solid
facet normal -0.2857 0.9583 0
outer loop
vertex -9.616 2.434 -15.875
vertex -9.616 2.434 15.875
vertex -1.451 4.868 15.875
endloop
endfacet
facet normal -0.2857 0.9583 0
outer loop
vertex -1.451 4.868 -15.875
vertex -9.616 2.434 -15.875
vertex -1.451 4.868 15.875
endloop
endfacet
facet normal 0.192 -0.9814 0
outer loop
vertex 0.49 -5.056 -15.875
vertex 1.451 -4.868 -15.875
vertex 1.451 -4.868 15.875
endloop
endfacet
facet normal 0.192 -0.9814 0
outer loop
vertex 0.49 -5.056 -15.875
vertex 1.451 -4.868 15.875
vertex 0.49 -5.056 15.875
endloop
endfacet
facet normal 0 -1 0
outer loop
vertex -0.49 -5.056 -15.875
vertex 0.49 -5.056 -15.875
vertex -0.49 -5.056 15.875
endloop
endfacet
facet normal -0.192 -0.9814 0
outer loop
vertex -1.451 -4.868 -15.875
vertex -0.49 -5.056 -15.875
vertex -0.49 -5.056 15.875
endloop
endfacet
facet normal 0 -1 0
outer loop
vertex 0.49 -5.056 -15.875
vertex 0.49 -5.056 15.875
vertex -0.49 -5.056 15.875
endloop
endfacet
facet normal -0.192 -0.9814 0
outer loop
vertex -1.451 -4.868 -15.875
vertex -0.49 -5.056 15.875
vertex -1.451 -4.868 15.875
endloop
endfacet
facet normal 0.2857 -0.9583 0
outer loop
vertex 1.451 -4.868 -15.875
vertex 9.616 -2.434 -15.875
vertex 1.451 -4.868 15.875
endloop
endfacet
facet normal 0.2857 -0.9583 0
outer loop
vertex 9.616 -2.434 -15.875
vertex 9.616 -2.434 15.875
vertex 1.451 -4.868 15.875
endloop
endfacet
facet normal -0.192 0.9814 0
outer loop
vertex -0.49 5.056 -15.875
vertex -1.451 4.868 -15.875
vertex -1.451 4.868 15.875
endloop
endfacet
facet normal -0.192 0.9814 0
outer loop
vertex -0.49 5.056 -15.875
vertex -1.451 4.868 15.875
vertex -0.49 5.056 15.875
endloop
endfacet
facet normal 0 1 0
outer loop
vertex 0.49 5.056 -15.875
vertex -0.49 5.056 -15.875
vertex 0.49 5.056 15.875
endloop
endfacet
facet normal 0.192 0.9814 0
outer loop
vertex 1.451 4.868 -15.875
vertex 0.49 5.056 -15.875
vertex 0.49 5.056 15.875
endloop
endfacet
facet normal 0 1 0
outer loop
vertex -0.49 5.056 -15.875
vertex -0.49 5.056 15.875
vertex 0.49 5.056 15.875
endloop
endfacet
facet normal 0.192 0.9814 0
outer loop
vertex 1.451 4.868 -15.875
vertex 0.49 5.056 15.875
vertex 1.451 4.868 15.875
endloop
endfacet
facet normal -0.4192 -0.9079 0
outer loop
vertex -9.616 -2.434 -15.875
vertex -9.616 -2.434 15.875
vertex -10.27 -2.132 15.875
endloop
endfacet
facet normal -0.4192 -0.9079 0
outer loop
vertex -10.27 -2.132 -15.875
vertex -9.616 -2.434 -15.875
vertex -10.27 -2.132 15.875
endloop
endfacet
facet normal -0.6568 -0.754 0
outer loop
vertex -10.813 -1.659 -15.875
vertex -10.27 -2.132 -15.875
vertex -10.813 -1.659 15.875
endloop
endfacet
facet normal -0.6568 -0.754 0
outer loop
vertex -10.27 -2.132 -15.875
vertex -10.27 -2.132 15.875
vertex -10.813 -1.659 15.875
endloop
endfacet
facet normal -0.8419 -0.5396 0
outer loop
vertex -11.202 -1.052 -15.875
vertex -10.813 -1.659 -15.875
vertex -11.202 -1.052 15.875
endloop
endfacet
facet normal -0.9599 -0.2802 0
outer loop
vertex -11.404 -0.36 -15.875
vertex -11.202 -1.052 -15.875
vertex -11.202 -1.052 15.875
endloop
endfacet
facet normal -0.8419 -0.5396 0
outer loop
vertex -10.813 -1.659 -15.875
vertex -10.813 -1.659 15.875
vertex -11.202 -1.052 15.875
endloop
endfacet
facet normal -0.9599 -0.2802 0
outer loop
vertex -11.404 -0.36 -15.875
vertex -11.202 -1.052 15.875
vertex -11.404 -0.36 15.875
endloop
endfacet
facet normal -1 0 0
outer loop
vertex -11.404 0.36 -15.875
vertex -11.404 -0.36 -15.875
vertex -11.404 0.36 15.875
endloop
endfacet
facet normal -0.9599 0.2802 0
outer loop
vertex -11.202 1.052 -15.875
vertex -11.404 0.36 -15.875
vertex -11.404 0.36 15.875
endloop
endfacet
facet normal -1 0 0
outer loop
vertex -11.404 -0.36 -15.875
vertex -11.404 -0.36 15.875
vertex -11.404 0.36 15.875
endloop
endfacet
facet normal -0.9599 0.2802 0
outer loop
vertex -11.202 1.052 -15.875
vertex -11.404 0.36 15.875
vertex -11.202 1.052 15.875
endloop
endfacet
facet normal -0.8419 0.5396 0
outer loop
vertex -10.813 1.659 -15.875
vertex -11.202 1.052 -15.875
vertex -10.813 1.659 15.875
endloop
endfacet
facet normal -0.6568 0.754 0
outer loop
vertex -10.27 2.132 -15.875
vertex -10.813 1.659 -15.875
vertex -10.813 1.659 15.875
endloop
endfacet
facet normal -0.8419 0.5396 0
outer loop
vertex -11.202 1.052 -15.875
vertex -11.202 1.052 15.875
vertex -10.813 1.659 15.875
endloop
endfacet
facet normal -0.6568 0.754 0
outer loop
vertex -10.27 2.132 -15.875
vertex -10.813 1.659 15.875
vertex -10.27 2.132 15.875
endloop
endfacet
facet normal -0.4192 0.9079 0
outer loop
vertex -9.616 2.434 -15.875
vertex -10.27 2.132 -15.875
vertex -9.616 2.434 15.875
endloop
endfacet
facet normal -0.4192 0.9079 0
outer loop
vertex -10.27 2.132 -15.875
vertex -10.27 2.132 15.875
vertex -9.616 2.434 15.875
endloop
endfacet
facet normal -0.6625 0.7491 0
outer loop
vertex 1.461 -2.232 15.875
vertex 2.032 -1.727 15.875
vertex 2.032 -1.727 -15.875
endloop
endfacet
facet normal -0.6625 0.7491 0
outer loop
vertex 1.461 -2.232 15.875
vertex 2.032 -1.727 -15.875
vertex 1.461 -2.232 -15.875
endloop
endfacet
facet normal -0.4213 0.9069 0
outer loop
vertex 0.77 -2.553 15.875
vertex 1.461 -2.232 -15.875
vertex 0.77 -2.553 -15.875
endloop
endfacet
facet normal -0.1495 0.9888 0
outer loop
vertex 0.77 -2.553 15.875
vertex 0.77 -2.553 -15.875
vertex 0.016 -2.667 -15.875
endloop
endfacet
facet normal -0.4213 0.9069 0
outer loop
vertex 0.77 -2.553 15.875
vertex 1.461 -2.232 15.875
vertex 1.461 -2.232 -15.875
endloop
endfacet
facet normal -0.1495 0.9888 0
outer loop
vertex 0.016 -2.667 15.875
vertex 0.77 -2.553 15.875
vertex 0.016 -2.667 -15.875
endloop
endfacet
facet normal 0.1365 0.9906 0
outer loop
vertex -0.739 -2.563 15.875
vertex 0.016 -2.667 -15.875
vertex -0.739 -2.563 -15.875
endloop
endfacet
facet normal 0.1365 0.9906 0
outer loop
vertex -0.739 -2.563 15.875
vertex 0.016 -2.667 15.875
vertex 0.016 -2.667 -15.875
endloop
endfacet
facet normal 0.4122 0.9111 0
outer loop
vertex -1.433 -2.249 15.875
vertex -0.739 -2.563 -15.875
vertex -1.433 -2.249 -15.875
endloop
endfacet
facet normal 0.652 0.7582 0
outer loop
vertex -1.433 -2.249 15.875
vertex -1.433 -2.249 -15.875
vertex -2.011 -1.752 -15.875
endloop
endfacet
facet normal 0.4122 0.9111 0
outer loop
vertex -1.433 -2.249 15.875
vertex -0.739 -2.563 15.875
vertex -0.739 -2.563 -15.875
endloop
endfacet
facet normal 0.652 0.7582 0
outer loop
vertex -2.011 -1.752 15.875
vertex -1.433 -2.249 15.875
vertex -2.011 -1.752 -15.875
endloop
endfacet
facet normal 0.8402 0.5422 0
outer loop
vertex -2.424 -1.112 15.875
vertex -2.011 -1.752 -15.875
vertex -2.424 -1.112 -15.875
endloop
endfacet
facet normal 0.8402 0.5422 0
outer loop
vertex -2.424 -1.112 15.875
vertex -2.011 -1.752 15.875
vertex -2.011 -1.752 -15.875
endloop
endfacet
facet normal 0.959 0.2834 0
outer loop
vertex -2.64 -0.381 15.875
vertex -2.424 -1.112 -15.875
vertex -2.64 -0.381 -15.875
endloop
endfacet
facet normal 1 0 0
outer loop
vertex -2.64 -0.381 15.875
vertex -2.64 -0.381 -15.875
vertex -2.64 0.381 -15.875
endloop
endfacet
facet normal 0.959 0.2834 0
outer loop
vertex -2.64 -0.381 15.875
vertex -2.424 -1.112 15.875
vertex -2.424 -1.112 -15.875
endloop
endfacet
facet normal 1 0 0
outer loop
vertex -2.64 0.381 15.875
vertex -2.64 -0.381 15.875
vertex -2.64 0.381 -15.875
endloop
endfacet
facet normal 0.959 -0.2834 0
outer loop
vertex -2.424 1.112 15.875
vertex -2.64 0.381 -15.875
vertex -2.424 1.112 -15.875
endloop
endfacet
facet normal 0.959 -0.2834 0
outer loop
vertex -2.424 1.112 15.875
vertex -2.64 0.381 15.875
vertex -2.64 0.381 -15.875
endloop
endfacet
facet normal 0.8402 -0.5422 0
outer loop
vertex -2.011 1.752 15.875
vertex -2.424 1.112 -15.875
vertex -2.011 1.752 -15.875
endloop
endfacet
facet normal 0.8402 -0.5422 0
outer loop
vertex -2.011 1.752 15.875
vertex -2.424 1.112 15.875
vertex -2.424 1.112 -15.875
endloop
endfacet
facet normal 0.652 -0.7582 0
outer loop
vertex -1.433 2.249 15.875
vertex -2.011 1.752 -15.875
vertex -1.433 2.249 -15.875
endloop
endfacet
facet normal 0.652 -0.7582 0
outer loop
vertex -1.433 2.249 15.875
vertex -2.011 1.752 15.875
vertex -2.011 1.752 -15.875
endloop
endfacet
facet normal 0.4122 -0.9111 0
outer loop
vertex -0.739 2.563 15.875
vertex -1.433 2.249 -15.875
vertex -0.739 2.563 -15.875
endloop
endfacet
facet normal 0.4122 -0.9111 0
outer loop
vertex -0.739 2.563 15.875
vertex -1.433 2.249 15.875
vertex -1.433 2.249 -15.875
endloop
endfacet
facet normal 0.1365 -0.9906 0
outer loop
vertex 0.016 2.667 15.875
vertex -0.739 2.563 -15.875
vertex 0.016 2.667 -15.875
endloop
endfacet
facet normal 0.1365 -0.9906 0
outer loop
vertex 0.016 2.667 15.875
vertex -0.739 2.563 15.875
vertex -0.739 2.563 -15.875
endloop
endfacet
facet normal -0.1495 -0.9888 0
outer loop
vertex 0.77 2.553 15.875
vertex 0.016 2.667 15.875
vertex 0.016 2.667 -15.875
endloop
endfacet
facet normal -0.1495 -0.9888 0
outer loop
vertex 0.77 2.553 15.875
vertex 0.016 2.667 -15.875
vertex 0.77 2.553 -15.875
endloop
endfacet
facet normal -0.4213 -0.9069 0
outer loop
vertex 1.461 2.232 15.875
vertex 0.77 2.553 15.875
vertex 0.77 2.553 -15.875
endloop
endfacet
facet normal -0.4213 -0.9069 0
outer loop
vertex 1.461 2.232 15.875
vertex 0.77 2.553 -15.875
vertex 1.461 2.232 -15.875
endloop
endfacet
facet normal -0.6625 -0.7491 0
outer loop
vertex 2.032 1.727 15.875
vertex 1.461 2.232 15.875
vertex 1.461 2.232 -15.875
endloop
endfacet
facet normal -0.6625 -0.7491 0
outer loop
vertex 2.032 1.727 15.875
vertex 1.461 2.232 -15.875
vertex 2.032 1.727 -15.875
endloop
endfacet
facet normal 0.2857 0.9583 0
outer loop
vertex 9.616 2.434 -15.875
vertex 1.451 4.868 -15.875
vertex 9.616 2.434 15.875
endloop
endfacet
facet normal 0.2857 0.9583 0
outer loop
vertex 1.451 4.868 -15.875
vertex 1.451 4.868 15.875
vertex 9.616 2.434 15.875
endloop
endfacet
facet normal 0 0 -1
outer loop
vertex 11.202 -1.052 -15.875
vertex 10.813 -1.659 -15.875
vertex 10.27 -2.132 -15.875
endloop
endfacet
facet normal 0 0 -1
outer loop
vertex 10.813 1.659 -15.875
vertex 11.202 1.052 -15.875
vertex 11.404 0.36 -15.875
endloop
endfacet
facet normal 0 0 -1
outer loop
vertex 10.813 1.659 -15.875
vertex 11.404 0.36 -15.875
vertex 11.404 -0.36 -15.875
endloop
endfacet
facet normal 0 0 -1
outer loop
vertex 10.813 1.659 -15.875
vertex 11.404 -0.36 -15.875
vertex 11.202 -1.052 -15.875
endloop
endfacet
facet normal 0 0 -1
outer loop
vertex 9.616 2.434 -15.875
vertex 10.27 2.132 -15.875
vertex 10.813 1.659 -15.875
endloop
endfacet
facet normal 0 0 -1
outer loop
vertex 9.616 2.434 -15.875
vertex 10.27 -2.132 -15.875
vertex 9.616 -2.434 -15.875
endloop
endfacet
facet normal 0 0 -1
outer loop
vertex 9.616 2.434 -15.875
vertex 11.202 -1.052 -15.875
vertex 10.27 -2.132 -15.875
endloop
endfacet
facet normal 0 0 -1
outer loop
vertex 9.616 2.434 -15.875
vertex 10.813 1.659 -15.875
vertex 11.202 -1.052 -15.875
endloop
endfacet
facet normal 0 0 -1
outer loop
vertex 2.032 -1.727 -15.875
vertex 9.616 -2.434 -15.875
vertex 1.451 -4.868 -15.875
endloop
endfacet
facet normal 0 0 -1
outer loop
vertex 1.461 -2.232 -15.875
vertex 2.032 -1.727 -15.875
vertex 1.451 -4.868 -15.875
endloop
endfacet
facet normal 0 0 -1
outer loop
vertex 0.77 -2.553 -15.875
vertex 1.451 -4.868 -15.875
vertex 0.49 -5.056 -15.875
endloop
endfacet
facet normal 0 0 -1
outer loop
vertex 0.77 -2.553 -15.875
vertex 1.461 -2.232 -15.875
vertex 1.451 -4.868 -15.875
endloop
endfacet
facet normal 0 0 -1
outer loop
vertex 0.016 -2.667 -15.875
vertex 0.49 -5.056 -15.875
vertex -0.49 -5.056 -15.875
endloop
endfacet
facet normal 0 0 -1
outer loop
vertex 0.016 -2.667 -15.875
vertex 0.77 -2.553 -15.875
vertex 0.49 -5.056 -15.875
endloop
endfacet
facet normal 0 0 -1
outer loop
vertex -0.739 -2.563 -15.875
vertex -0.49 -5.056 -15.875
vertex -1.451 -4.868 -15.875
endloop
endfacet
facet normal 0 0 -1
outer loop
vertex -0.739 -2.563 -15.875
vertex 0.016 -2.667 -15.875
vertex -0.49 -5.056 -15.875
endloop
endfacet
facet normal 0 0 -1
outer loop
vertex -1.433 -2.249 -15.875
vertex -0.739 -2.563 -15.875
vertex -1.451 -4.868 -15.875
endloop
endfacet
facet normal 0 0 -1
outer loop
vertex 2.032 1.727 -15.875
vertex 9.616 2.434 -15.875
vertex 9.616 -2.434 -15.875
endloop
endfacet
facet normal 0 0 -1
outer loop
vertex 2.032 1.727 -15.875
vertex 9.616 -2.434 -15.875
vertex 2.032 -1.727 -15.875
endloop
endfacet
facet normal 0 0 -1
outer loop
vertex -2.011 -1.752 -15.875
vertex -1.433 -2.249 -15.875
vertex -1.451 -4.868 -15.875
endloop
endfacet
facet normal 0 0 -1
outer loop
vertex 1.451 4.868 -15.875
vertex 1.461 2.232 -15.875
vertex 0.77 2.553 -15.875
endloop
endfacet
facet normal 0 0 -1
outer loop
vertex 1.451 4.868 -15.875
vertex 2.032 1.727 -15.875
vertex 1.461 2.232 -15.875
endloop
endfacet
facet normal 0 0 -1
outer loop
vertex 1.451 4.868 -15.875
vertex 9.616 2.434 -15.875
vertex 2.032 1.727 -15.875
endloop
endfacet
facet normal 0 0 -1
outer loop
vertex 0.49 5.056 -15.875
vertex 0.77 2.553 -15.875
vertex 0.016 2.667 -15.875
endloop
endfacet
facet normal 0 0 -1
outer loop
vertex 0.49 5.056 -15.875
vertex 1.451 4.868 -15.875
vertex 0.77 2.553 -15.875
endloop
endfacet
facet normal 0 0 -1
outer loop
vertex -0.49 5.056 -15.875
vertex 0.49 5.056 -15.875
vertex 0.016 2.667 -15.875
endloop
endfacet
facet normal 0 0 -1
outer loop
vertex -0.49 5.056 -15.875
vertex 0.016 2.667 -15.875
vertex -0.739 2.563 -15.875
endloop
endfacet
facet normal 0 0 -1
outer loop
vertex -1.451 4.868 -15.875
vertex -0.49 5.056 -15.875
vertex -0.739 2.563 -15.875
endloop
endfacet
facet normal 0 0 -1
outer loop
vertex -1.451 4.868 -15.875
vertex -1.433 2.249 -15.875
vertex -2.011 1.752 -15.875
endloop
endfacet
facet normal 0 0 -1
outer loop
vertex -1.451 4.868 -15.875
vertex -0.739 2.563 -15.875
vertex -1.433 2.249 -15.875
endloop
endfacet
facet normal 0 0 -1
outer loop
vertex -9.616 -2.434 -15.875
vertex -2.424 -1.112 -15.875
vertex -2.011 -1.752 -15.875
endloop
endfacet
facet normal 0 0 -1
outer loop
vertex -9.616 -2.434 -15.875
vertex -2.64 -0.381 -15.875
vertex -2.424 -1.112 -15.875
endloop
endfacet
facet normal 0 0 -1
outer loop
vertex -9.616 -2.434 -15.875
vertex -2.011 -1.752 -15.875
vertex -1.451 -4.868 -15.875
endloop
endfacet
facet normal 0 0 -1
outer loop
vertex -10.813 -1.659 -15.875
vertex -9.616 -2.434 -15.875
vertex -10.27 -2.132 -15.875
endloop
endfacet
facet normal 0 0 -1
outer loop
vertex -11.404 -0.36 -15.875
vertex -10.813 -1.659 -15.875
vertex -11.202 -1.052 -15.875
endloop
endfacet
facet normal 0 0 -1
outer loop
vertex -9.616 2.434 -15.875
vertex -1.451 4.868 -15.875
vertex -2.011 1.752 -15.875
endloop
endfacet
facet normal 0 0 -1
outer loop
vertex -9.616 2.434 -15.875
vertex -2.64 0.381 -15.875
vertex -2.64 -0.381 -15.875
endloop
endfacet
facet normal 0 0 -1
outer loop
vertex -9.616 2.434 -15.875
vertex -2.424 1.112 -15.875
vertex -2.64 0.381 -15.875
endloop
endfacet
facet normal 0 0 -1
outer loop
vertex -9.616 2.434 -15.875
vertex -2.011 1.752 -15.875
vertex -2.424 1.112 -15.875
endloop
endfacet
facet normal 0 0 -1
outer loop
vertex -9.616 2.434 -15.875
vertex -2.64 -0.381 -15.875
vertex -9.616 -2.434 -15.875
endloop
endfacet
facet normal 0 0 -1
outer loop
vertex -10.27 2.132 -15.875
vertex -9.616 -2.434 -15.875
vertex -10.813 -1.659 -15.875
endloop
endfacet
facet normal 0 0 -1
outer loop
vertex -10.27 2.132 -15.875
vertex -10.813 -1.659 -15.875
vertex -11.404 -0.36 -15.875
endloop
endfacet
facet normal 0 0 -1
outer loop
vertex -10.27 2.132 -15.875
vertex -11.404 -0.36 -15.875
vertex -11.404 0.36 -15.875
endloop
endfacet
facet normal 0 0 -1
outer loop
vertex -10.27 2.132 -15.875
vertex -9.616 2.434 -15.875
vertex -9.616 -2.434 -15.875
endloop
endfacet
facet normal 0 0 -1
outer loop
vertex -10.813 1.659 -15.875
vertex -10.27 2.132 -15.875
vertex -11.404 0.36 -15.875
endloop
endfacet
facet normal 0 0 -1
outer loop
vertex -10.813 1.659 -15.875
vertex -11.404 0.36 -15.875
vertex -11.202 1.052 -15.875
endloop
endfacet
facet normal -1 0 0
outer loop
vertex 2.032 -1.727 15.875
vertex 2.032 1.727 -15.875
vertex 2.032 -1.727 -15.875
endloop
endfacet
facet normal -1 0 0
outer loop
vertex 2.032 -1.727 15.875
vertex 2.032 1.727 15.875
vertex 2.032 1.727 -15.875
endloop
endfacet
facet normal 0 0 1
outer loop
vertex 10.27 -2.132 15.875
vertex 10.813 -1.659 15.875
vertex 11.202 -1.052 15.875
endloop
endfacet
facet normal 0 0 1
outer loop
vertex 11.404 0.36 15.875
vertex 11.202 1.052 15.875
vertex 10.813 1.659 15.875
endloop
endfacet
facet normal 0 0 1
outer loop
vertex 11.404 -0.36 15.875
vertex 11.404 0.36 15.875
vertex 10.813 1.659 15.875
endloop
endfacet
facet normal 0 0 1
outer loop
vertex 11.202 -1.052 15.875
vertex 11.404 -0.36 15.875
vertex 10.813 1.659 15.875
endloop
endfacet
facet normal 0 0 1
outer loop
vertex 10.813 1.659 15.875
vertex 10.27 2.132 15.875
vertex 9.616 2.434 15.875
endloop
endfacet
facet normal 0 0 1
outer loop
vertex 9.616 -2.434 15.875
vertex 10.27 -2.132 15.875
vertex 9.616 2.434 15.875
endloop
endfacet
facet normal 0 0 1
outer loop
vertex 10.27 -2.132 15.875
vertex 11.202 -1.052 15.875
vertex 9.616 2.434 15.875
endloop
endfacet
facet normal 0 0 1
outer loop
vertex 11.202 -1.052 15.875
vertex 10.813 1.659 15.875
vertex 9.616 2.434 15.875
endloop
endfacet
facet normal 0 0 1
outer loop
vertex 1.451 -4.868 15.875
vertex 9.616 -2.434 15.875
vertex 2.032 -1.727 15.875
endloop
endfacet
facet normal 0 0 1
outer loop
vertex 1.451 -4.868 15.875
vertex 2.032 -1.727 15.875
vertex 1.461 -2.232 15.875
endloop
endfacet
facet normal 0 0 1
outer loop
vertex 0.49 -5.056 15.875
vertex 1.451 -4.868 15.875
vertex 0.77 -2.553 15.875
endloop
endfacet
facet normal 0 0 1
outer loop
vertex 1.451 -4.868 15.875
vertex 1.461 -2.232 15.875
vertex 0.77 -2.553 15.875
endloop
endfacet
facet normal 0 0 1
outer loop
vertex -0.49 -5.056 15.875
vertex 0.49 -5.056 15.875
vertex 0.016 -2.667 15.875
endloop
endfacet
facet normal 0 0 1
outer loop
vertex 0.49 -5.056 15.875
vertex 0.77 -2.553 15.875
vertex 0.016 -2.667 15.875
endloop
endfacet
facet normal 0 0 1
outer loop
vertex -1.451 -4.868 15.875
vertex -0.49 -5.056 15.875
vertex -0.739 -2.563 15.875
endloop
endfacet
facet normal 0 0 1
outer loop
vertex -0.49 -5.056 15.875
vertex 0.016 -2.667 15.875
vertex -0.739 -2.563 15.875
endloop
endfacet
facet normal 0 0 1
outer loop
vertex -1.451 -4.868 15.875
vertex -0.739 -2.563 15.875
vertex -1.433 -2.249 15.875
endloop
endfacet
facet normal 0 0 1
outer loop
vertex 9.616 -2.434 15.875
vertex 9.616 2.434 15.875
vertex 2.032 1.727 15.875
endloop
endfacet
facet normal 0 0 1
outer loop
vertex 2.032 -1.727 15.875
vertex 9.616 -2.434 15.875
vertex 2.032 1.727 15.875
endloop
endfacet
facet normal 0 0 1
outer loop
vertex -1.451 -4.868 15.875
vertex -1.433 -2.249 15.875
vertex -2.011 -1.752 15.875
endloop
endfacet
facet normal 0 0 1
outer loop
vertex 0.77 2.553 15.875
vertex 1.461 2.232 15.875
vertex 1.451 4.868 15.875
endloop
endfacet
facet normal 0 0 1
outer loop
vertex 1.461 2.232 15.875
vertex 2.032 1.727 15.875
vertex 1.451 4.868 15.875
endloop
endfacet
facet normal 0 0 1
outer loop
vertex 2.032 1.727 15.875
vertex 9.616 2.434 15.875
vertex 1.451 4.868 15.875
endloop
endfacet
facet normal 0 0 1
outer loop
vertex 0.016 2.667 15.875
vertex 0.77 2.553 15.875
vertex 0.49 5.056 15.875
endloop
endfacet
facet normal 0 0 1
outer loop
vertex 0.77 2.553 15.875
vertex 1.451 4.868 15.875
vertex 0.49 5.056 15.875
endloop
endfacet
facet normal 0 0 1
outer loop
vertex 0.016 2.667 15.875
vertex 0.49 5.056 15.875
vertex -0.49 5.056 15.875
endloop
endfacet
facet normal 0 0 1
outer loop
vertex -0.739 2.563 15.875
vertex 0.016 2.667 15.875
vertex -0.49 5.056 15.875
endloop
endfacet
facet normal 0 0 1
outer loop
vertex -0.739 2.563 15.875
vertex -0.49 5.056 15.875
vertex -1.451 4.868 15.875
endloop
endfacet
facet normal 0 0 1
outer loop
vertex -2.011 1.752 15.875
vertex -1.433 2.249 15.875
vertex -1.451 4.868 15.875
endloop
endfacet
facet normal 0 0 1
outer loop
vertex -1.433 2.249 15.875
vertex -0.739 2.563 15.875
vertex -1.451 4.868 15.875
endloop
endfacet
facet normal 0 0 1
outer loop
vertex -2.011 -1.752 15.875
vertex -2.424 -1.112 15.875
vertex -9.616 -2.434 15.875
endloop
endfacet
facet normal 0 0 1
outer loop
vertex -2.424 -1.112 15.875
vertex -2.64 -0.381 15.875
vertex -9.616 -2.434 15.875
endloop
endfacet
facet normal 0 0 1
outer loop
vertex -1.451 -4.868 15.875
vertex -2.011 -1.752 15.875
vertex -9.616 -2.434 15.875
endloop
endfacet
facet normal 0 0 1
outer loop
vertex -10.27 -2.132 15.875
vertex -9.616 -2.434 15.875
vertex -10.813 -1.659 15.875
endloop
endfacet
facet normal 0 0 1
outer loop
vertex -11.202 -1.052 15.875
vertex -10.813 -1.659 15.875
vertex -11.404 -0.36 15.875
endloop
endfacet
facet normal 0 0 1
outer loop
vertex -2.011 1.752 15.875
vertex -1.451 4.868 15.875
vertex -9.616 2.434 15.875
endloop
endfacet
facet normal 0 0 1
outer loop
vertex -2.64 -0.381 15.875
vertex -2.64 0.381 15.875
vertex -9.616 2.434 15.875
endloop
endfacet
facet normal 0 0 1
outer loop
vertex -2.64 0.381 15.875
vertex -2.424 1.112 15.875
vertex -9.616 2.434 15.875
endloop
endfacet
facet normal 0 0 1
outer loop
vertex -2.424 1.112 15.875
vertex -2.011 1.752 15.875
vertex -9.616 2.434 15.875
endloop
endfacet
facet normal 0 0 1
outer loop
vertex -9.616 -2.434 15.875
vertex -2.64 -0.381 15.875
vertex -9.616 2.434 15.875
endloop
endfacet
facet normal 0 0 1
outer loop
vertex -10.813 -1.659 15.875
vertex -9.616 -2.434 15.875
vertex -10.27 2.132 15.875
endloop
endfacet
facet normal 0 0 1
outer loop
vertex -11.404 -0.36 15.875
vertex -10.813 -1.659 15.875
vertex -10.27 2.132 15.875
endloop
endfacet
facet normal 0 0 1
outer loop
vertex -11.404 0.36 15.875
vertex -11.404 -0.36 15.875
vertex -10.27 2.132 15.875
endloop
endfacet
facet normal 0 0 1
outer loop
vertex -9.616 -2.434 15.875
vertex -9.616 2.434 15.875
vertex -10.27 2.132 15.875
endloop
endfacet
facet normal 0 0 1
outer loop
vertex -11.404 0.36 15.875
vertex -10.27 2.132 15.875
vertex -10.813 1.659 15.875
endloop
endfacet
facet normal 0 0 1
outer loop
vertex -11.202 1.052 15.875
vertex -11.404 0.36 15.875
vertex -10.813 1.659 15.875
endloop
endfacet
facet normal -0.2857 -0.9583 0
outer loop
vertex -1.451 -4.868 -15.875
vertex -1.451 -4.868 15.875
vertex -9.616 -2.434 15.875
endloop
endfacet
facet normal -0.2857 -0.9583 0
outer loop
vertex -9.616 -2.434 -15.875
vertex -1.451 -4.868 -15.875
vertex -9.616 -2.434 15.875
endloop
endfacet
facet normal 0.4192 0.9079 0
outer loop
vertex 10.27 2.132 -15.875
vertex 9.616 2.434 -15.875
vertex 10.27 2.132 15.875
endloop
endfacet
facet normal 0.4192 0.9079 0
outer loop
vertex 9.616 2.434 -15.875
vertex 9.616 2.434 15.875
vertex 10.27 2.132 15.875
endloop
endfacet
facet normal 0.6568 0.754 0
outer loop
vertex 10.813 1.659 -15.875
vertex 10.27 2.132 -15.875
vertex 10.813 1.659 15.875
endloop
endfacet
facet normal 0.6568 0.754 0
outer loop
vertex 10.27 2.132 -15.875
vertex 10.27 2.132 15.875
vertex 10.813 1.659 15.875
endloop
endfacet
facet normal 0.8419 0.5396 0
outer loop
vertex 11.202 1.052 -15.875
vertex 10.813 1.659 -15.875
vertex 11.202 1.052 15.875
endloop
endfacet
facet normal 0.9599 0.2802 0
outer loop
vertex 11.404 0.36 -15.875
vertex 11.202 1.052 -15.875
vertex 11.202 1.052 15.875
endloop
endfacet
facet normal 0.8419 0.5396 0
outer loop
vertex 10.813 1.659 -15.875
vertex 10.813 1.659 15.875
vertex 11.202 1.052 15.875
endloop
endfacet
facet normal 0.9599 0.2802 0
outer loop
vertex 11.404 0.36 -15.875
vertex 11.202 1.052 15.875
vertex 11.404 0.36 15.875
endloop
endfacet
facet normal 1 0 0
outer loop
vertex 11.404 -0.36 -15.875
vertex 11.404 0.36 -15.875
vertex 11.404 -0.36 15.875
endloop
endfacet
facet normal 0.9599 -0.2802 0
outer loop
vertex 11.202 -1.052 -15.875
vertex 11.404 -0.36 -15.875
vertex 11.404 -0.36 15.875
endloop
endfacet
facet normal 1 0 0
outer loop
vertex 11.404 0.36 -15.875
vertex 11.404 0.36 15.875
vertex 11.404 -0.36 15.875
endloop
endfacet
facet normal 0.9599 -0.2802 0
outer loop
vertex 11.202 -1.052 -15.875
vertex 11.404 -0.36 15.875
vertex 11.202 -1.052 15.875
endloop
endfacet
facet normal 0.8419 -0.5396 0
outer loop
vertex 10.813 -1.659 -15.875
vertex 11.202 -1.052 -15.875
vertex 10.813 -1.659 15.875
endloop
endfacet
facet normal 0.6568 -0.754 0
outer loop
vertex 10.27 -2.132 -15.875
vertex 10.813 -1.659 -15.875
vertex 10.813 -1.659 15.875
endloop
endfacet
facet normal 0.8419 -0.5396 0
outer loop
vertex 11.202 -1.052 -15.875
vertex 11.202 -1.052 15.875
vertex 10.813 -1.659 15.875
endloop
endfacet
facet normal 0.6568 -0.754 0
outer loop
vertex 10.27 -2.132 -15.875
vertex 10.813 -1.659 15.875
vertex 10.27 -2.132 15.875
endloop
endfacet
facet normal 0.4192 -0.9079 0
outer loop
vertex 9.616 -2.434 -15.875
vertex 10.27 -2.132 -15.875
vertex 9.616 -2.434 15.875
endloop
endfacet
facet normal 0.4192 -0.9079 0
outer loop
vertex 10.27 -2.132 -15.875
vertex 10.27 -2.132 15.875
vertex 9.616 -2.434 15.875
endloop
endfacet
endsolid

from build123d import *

# Parameters (mm, degrees)
BOSS_EXTRUDE1_DEPTH = 15.875


with BuildPart() as part:
    # Sketch1 → Boss-Extrude1 (new, symmetric)
    with BuildSketch(Plane.XY):
        with BuildLine():
            Line((-9.615714286, 2.434119713), (-1.451428571, 4.868239425))
            ThreePointArc((-1.451428571, 4.868239425), (0, 5.08), (1.451428571, 4.868239425))
            Line((1.451428571, 4.868239425), (9.615714286, 2.434119713))
            ThreePointArc((9.615714286, 2.434119713), (11.43, 0), (9.615714286, -2.434119713))
            Line((9.615714286, -2.434119713), (1.451428571, -4.868239425))
            ThreePointArc((1.451428571, -4.868239425), (0, -5.08), (-1.451428571, -4.868239425))
            Line((-1.451428571, -4.868239425), (-9.615714286, -2.434119713))
            ThreePointArc((-9.615714286, -2.434119713), (-11.43, 0), (-9.615714286, 2.434119713))
        make_face()
        with BuildLine():
            Line((2.032, 1.727386755), (2.032, -1.727386755))
            ThreePointArc((2.032, -1.727386755), (-2.667, 0), (2.032, 1.727386755))
        make_face(mode=Mode.SUBTRACT)
    extrude(amount=BOSS_EXTRUDE1_DEPTH, both=True)


solid = part.part
